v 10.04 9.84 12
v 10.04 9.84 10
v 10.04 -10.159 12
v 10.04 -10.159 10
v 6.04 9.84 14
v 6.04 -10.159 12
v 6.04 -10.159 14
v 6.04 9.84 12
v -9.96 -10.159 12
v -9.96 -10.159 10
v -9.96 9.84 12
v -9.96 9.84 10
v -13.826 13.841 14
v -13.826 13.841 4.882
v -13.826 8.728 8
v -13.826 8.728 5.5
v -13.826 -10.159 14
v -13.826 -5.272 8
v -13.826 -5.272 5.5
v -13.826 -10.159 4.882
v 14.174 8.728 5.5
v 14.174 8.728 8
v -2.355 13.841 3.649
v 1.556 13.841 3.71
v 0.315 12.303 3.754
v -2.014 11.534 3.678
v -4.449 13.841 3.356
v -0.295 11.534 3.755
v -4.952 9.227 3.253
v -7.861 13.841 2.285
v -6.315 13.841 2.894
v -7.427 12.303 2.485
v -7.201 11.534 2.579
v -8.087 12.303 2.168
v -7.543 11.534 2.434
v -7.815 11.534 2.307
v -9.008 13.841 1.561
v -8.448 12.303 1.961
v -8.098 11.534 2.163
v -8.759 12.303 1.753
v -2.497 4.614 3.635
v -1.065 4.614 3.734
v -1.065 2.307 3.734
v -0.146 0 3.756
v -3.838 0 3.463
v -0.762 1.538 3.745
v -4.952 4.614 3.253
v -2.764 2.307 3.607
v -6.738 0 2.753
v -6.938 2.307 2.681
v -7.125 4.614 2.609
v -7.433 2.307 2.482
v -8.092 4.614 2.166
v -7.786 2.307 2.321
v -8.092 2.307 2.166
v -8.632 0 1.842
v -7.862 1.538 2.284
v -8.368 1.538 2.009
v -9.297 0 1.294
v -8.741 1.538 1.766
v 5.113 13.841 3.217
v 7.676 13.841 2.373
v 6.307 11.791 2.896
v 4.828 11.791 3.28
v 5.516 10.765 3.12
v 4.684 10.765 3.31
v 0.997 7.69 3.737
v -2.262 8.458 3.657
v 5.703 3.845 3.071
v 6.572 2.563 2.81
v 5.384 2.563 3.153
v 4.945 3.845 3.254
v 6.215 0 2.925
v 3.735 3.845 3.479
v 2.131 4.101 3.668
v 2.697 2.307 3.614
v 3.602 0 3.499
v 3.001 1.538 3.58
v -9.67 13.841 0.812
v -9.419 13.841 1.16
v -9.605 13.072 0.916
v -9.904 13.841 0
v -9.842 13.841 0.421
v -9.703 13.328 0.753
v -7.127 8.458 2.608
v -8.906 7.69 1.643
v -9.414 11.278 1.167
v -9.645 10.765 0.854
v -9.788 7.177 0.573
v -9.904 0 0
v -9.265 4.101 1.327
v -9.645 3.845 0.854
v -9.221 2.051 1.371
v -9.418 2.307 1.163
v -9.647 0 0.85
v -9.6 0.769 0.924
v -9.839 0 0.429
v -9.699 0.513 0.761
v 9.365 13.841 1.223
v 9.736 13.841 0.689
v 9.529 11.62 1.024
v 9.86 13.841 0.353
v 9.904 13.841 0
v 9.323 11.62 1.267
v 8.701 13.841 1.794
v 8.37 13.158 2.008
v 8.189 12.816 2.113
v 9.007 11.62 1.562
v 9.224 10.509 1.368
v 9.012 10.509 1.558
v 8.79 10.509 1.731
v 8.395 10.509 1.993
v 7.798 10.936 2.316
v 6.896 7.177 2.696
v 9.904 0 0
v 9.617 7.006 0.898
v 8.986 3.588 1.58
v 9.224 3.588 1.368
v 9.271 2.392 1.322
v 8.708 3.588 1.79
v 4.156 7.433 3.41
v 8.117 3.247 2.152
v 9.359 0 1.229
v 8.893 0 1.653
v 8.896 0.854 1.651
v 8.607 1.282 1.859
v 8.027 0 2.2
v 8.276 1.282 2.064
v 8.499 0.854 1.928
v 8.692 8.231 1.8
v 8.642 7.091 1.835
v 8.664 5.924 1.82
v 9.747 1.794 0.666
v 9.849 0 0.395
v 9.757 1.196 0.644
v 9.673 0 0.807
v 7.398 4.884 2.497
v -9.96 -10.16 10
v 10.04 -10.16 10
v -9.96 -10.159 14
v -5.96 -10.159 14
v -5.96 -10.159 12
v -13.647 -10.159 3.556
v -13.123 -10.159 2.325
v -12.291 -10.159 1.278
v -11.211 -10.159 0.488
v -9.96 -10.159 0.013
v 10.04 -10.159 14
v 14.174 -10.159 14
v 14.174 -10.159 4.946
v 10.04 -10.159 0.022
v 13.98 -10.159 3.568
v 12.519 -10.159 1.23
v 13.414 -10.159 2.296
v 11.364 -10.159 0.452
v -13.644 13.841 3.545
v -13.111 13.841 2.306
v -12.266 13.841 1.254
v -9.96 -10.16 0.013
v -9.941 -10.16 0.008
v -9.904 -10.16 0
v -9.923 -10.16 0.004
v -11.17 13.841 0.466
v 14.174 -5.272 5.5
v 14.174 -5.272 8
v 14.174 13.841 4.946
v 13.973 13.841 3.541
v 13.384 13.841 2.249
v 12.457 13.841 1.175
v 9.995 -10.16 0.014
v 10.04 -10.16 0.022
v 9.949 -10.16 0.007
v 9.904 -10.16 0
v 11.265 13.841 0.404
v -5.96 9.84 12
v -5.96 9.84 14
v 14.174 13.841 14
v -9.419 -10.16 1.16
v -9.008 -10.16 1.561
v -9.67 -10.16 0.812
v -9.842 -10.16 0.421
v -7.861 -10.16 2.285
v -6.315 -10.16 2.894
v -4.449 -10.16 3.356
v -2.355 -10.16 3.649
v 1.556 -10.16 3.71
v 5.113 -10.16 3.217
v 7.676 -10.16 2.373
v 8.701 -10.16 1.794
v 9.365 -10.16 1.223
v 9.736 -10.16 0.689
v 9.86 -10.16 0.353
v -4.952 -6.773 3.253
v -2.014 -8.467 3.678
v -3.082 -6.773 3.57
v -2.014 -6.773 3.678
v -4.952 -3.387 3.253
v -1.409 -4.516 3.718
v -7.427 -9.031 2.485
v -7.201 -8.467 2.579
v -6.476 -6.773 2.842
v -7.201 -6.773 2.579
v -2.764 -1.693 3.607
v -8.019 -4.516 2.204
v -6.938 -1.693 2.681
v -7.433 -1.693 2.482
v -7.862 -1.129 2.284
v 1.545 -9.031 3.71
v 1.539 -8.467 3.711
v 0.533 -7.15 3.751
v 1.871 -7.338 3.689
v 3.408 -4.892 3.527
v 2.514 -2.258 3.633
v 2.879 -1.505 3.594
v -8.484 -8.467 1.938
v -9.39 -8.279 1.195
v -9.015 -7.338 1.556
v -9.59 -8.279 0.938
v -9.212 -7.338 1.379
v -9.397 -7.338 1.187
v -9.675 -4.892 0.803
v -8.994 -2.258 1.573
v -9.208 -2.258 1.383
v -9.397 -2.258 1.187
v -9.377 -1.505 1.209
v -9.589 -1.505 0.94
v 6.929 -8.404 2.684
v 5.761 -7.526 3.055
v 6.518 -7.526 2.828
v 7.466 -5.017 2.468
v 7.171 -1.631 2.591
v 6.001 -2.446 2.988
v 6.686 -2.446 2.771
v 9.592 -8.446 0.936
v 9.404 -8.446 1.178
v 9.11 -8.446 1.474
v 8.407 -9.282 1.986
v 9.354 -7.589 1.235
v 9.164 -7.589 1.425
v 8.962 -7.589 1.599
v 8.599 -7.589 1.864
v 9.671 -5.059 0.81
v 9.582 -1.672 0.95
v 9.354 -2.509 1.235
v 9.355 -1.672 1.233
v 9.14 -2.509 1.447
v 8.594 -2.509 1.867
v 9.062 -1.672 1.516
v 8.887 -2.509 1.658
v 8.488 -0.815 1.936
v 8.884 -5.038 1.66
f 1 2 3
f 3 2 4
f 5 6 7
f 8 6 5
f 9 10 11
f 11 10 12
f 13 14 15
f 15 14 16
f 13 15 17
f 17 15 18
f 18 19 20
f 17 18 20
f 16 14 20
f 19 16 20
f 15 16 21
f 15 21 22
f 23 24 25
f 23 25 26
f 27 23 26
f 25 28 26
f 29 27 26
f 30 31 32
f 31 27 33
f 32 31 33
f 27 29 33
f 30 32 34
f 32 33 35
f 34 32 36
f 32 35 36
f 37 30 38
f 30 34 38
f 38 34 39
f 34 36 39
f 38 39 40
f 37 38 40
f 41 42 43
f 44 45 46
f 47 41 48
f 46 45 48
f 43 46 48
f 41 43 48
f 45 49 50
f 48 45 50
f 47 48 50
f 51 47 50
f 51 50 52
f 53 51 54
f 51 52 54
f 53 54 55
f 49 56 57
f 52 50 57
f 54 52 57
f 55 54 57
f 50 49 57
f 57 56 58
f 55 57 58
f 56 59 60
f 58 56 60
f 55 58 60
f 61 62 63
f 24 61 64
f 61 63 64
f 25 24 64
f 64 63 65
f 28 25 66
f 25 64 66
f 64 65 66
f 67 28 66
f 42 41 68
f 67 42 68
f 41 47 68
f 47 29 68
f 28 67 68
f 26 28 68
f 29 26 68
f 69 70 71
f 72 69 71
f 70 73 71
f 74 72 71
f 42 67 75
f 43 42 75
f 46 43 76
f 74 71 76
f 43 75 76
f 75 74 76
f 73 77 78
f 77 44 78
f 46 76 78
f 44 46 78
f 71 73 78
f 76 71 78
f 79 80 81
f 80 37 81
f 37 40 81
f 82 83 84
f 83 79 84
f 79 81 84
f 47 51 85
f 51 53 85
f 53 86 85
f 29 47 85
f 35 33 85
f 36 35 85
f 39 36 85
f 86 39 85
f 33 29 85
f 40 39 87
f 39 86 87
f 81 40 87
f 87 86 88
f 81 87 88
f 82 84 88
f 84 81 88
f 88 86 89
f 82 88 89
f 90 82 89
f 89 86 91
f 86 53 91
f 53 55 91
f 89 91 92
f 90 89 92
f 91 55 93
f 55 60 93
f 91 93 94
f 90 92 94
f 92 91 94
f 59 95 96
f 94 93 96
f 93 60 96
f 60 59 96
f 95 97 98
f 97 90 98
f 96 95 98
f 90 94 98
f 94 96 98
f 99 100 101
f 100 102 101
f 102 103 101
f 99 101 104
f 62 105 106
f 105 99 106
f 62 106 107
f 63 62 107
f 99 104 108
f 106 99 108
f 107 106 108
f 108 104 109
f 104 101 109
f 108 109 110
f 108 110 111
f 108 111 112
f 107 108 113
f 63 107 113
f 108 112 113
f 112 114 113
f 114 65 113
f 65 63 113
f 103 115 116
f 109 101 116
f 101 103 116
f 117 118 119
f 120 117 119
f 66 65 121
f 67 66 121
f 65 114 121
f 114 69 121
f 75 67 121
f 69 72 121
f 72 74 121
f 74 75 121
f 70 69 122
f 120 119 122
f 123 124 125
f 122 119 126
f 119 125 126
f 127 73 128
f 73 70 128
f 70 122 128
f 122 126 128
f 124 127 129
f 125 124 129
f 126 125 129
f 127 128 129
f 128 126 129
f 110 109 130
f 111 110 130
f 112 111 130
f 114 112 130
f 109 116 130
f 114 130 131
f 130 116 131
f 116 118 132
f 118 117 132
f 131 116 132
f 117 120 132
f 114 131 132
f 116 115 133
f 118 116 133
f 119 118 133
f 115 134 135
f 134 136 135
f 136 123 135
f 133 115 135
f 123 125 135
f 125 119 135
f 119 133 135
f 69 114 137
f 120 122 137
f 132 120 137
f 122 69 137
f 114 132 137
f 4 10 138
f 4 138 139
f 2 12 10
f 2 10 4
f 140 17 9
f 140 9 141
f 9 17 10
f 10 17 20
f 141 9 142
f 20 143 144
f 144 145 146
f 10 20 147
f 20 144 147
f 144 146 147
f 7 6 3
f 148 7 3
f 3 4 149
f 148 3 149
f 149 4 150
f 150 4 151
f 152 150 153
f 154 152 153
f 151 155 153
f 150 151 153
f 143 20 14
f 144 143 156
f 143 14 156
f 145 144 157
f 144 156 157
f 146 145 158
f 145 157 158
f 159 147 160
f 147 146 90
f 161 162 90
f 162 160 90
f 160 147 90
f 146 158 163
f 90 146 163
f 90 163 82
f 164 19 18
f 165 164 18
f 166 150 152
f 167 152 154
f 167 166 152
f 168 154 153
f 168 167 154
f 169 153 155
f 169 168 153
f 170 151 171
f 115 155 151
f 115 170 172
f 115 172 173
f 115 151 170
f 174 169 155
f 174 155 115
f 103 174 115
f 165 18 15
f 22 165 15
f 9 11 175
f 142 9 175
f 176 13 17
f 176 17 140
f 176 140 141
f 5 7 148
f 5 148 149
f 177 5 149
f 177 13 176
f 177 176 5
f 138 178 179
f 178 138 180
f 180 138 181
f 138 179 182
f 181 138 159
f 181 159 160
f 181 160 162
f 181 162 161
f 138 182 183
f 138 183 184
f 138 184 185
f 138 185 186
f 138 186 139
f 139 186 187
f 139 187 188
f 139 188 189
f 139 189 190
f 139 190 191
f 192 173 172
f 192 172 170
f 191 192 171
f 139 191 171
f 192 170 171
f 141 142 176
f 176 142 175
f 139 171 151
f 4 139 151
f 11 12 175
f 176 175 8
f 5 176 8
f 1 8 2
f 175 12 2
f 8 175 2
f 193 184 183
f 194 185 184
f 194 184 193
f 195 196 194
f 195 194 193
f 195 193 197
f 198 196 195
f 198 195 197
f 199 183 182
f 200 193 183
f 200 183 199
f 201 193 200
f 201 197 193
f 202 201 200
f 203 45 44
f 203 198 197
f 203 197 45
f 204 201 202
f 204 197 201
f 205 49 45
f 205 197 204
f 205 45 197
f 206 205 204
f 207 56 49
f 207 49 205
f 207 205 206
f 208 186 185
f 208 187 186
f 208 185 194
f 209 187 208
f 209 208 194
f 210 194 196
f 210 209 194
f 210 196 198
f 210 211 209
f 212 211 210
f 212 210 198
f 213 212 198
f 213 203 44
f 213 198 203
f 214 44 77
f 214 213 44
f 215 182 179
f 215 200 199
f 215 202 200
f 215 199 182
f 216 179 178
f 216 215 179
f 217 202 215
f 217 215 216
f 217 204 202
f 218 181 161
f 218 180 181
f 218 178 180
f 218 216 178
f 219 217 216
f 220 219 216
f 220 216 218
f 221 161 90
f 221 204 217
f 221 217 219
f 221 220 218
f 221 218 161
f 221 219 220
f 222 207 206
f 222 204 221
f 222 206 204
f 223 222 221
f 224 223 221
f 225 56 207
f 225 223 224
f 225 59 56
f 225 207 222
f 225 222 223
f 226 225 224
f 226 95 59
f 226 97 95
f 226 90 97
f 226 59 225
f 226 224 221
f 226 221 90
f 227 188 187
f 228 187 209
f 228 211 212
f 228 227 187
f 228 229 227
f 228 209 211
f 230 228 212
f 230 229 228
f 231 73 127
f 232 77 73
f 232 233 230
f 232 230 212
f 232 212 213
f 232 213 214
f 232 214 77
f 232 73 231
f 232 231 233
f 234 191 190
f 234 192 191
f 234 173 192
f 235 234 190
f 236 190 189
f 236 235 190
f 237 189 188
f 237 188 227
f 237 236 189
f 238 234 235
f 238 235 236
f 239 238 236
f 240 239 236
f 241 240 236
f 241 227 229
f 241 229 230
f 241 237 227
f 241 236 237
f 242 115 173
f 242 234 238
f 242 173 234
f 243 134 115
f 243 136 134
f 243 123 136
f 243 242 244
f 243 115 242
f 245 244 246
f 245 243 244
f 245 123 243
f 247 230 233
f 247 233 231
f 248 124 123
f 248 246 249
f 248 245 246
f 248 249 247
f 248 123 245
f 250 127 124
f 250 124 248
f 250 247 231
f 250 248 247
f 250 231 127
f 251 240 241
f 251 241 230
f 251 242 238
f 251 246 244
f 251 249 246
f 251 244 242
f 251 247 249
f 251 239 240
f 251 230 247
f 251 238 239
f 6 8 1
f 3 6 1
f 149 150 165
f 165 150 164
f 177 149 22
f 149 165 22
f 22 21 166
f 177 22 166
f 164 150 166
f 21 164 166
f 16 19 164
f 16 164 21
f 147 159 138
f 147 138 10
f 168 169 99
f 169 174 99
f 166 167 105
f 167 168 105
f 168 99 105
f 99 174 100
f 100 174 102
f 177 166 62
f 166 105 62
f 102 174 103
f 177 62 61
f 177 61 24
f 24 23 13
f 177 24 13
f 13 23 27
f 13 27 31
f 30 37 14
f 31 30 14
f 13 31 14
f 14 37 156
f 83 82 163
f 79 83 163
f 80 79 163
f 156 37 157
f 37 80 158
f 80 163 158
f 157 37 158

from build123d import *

# Parameters (mm, degrees)
F0_W          = 4
F0_H          = 19.9986558093
F0_W_2        = 12
F0_H_2        = 0.0013441907
F1_DEPTH      = 10
F2_DEPTH      = 14
F3_START      = 12
F3_DEPTH      = 2
F4_W          = 14
F4_H          = 2.5
F5_DEPTH      = 25
F5_DEPTH_BACK = 25
F7_DEPTH      = 25
F7_DEPTH_BACK = 25
F8_T1_DEPTH   = 22.5250523131
F8_T3_DEPTH   = 26.207315151
F8_T5_DEPTH   = 26.047082038
F8_T7_DEPTH   = 22.364820273


# Not quite as in the source:
# - a fillet or chamfer that OpenCascade refuses, or shapes differently, is made with other operations: its cross-section is extruded or revolved along the edge and cut away or added


with BuildPart() as f1:
    # F0 (on Top) → F1 (new body)
    with BuildSketch(Plane.XY):
        Polygon((-9.9598446302, -10.1588685066), (-9.9598446302, 9.8397873028), (-5.9598446302, 9.8397873028), (6.0401553698, 9.8397873028), (10.0401553698, 9.8397873028), (10.0401553698, -10.1588685066), (14.174235519, -10.1588685066), (14.174235519, 13.8411314934), (-13.825764481, 13.8411314934), (-13.825764481, -10.1588685066), align=None)
        with Locations((-7.9598446302, -0.1595406019)):
            Rectangle(F0_W, F0_H)
        with Locations((0.0401553698, -0.1595406019)):
            Rectangle(F0_W_2, F0_H)
        with Locations((-7.9598446302, -10.1595406019)):
            Rectangle(F0_W, F0_H_2)
        with Locations((8.0401553698, -0.1595406019)):
            Rectangle(F0_W, F0_H)
        with Locations((0.0401553698, -10.1595406019)):
            Rectangle(F0_W_2, F0_H_2)
        with Locations((8.0401553698, -10.1595406019)):
            Rectangle(F0_W, F0_H_2)
    extrude(amount=F1_DEPTH)

    # F0 (on Top) → F2 (join)
    with BuildSketch(Plane.XY):
        Polygon((-9.9598446302, -10.1588685066), (-9.9598446302, 9.8397873028), (-5.9598446302, 9.8397873028), (6.0401553698, 9.8397873028), (10.0401553698, 9.8397873028), (10.0401553698, -10.1588685066), (14.174235519, -10.1588685066), (14.174235519, 13.8411314934), (-13.825764481, 13.8411314934), (-13.825764481, -10.1588685066), align=None)
    extrude(amount=F2_DEPTH)

    # F0 (on Top) → F3 (join)
    with BuildSketch(Plane.XY.offset(F3_START)):
        with Locations((8.0401553698, -0.1595406019)):
            Rectangle(F0_W, F0_H)
        with Locations((-7.9598446302, -0.1595406019)):
            Rectangle(F0_W, F0_H)
    extrude(amount=F3_DEPTH)

    # F4 (on Right) → F5 (cut, two sides)
    with BuildSketch(Plane.YZ) as f5_sk:
        with Locations((1.7279156186, 6.75)):
            Rectangle(F4_W, F4_H)
    extrude(amount=-F5_DEPTH, mode=Mode.SUBTRACT)
    extrude(f5_sk.sketch, amount=F5_DEPTH_BACK, mode=Mode.SUBTRACT)

    # F6 (on Front) → F7 (cut, two sides)
    with BuildSketch(Plane.XZ) as f7_sk:
        with BuildLine():
            add(Edge.make_bspline(
                [(9.9038929624, 0), (9.9038929624, 6.5060013768), (-4.9519464812, 3.2530006884), (-19.8077859248, 0), (-4.9519464812, -3.2530006884), (9.9038929624, -6.5060013768), (9.9038929624, 0)],
                knots=[0, 0, 0, 2.0943951024, 2.0943951024, 4.1887902048, 4.1887902048, 6.2831853072, 6.2831853072, 6.2831853072], degree=2, weights=[1, 0.5, 1, 0.5, 1, 0.5, 1]))
        make_face()
    extrude(amount=-F7_DEPTH, mode=Mode.SUBTRACT)
    extrude(f7_sk.sketch, amount=F7_DEPTH_BACK, mode=Mode.SUBTRACT)

    # F8: fillet of radius 5 on 2 edges, made by hand

    # F8_s2 → F8_t1 (cut)
    with BuildSketch(Plane.XZ.offset(-7.45e-08)):
        with BuildLine():
            ThreePointArc((14.174235519, 4.9464734928), (12.9589605564, 1.6790805885), (9.9038929624, 0))
            Line((9.9038929624, 0), (14.174235519, 0))
            Line((14.174235519, 0), (14.174235519, 4.9464734928))
        make_face()
    extrude(amount=F8_T1_DEPTH, mode=Mode.SUBTRACT)

    # F8_s4 → F8_t3 (cut)
    with BuildSketch(Plane.XZ.offset(-26.2073152255)):
        with BuildLine():
            ThreePointArc((14.174235519, 4.9464734928), (12.9589605564, 1.6790805885), (9.9038929624, 0))
            Line((9.9038929624, 0), (14.174235519, 0))
            Line((14.174235519, 0), (14.174235519, 4.9464734928))
        make_face()
    extrude(amount=F8_T3_DEPTH, mode=Mode.SUBTRACT)

    # F8_s6 → F8_t5 (cut)
    with BuildSketch(Plane.XZ.offset(-26.0470826489)):
        with BuildLine():
            ThreePointArc((-13.825764481, 4.8823804622), (-12.7238821297, 1.7511380895), (-9.9038929624, 0))
            Line((-9.9038929624, 0), (-13.825764481, 0))
            Line((-13.825764481, 0), (-13.825764481, 4.8823804622))
        make_face()
    extrude(amount=F8_T5_DEPTH, mode=Mode.SUBTRACT)

    # F8_s8 → F8_t7 (cut)
    with BuildSketch(Plane.XZ.offset(-6.109e-07)):
        with BuildLine():
            ThreePointArc((-13.825764481, 4.8823804622), (-12.7238821297, 1.7511380895), (-9.9038929624, 0))
            Line((-9.9038929624, 0), (-13.825764481, 0))
            Line((-13.825764481, 0), (-13.825764481, 4.8823804622))
        make_face()
    extrude(amount=F8_T7_DEPTH, mode=Mode.SUBTRACT)


solid = f1.part
